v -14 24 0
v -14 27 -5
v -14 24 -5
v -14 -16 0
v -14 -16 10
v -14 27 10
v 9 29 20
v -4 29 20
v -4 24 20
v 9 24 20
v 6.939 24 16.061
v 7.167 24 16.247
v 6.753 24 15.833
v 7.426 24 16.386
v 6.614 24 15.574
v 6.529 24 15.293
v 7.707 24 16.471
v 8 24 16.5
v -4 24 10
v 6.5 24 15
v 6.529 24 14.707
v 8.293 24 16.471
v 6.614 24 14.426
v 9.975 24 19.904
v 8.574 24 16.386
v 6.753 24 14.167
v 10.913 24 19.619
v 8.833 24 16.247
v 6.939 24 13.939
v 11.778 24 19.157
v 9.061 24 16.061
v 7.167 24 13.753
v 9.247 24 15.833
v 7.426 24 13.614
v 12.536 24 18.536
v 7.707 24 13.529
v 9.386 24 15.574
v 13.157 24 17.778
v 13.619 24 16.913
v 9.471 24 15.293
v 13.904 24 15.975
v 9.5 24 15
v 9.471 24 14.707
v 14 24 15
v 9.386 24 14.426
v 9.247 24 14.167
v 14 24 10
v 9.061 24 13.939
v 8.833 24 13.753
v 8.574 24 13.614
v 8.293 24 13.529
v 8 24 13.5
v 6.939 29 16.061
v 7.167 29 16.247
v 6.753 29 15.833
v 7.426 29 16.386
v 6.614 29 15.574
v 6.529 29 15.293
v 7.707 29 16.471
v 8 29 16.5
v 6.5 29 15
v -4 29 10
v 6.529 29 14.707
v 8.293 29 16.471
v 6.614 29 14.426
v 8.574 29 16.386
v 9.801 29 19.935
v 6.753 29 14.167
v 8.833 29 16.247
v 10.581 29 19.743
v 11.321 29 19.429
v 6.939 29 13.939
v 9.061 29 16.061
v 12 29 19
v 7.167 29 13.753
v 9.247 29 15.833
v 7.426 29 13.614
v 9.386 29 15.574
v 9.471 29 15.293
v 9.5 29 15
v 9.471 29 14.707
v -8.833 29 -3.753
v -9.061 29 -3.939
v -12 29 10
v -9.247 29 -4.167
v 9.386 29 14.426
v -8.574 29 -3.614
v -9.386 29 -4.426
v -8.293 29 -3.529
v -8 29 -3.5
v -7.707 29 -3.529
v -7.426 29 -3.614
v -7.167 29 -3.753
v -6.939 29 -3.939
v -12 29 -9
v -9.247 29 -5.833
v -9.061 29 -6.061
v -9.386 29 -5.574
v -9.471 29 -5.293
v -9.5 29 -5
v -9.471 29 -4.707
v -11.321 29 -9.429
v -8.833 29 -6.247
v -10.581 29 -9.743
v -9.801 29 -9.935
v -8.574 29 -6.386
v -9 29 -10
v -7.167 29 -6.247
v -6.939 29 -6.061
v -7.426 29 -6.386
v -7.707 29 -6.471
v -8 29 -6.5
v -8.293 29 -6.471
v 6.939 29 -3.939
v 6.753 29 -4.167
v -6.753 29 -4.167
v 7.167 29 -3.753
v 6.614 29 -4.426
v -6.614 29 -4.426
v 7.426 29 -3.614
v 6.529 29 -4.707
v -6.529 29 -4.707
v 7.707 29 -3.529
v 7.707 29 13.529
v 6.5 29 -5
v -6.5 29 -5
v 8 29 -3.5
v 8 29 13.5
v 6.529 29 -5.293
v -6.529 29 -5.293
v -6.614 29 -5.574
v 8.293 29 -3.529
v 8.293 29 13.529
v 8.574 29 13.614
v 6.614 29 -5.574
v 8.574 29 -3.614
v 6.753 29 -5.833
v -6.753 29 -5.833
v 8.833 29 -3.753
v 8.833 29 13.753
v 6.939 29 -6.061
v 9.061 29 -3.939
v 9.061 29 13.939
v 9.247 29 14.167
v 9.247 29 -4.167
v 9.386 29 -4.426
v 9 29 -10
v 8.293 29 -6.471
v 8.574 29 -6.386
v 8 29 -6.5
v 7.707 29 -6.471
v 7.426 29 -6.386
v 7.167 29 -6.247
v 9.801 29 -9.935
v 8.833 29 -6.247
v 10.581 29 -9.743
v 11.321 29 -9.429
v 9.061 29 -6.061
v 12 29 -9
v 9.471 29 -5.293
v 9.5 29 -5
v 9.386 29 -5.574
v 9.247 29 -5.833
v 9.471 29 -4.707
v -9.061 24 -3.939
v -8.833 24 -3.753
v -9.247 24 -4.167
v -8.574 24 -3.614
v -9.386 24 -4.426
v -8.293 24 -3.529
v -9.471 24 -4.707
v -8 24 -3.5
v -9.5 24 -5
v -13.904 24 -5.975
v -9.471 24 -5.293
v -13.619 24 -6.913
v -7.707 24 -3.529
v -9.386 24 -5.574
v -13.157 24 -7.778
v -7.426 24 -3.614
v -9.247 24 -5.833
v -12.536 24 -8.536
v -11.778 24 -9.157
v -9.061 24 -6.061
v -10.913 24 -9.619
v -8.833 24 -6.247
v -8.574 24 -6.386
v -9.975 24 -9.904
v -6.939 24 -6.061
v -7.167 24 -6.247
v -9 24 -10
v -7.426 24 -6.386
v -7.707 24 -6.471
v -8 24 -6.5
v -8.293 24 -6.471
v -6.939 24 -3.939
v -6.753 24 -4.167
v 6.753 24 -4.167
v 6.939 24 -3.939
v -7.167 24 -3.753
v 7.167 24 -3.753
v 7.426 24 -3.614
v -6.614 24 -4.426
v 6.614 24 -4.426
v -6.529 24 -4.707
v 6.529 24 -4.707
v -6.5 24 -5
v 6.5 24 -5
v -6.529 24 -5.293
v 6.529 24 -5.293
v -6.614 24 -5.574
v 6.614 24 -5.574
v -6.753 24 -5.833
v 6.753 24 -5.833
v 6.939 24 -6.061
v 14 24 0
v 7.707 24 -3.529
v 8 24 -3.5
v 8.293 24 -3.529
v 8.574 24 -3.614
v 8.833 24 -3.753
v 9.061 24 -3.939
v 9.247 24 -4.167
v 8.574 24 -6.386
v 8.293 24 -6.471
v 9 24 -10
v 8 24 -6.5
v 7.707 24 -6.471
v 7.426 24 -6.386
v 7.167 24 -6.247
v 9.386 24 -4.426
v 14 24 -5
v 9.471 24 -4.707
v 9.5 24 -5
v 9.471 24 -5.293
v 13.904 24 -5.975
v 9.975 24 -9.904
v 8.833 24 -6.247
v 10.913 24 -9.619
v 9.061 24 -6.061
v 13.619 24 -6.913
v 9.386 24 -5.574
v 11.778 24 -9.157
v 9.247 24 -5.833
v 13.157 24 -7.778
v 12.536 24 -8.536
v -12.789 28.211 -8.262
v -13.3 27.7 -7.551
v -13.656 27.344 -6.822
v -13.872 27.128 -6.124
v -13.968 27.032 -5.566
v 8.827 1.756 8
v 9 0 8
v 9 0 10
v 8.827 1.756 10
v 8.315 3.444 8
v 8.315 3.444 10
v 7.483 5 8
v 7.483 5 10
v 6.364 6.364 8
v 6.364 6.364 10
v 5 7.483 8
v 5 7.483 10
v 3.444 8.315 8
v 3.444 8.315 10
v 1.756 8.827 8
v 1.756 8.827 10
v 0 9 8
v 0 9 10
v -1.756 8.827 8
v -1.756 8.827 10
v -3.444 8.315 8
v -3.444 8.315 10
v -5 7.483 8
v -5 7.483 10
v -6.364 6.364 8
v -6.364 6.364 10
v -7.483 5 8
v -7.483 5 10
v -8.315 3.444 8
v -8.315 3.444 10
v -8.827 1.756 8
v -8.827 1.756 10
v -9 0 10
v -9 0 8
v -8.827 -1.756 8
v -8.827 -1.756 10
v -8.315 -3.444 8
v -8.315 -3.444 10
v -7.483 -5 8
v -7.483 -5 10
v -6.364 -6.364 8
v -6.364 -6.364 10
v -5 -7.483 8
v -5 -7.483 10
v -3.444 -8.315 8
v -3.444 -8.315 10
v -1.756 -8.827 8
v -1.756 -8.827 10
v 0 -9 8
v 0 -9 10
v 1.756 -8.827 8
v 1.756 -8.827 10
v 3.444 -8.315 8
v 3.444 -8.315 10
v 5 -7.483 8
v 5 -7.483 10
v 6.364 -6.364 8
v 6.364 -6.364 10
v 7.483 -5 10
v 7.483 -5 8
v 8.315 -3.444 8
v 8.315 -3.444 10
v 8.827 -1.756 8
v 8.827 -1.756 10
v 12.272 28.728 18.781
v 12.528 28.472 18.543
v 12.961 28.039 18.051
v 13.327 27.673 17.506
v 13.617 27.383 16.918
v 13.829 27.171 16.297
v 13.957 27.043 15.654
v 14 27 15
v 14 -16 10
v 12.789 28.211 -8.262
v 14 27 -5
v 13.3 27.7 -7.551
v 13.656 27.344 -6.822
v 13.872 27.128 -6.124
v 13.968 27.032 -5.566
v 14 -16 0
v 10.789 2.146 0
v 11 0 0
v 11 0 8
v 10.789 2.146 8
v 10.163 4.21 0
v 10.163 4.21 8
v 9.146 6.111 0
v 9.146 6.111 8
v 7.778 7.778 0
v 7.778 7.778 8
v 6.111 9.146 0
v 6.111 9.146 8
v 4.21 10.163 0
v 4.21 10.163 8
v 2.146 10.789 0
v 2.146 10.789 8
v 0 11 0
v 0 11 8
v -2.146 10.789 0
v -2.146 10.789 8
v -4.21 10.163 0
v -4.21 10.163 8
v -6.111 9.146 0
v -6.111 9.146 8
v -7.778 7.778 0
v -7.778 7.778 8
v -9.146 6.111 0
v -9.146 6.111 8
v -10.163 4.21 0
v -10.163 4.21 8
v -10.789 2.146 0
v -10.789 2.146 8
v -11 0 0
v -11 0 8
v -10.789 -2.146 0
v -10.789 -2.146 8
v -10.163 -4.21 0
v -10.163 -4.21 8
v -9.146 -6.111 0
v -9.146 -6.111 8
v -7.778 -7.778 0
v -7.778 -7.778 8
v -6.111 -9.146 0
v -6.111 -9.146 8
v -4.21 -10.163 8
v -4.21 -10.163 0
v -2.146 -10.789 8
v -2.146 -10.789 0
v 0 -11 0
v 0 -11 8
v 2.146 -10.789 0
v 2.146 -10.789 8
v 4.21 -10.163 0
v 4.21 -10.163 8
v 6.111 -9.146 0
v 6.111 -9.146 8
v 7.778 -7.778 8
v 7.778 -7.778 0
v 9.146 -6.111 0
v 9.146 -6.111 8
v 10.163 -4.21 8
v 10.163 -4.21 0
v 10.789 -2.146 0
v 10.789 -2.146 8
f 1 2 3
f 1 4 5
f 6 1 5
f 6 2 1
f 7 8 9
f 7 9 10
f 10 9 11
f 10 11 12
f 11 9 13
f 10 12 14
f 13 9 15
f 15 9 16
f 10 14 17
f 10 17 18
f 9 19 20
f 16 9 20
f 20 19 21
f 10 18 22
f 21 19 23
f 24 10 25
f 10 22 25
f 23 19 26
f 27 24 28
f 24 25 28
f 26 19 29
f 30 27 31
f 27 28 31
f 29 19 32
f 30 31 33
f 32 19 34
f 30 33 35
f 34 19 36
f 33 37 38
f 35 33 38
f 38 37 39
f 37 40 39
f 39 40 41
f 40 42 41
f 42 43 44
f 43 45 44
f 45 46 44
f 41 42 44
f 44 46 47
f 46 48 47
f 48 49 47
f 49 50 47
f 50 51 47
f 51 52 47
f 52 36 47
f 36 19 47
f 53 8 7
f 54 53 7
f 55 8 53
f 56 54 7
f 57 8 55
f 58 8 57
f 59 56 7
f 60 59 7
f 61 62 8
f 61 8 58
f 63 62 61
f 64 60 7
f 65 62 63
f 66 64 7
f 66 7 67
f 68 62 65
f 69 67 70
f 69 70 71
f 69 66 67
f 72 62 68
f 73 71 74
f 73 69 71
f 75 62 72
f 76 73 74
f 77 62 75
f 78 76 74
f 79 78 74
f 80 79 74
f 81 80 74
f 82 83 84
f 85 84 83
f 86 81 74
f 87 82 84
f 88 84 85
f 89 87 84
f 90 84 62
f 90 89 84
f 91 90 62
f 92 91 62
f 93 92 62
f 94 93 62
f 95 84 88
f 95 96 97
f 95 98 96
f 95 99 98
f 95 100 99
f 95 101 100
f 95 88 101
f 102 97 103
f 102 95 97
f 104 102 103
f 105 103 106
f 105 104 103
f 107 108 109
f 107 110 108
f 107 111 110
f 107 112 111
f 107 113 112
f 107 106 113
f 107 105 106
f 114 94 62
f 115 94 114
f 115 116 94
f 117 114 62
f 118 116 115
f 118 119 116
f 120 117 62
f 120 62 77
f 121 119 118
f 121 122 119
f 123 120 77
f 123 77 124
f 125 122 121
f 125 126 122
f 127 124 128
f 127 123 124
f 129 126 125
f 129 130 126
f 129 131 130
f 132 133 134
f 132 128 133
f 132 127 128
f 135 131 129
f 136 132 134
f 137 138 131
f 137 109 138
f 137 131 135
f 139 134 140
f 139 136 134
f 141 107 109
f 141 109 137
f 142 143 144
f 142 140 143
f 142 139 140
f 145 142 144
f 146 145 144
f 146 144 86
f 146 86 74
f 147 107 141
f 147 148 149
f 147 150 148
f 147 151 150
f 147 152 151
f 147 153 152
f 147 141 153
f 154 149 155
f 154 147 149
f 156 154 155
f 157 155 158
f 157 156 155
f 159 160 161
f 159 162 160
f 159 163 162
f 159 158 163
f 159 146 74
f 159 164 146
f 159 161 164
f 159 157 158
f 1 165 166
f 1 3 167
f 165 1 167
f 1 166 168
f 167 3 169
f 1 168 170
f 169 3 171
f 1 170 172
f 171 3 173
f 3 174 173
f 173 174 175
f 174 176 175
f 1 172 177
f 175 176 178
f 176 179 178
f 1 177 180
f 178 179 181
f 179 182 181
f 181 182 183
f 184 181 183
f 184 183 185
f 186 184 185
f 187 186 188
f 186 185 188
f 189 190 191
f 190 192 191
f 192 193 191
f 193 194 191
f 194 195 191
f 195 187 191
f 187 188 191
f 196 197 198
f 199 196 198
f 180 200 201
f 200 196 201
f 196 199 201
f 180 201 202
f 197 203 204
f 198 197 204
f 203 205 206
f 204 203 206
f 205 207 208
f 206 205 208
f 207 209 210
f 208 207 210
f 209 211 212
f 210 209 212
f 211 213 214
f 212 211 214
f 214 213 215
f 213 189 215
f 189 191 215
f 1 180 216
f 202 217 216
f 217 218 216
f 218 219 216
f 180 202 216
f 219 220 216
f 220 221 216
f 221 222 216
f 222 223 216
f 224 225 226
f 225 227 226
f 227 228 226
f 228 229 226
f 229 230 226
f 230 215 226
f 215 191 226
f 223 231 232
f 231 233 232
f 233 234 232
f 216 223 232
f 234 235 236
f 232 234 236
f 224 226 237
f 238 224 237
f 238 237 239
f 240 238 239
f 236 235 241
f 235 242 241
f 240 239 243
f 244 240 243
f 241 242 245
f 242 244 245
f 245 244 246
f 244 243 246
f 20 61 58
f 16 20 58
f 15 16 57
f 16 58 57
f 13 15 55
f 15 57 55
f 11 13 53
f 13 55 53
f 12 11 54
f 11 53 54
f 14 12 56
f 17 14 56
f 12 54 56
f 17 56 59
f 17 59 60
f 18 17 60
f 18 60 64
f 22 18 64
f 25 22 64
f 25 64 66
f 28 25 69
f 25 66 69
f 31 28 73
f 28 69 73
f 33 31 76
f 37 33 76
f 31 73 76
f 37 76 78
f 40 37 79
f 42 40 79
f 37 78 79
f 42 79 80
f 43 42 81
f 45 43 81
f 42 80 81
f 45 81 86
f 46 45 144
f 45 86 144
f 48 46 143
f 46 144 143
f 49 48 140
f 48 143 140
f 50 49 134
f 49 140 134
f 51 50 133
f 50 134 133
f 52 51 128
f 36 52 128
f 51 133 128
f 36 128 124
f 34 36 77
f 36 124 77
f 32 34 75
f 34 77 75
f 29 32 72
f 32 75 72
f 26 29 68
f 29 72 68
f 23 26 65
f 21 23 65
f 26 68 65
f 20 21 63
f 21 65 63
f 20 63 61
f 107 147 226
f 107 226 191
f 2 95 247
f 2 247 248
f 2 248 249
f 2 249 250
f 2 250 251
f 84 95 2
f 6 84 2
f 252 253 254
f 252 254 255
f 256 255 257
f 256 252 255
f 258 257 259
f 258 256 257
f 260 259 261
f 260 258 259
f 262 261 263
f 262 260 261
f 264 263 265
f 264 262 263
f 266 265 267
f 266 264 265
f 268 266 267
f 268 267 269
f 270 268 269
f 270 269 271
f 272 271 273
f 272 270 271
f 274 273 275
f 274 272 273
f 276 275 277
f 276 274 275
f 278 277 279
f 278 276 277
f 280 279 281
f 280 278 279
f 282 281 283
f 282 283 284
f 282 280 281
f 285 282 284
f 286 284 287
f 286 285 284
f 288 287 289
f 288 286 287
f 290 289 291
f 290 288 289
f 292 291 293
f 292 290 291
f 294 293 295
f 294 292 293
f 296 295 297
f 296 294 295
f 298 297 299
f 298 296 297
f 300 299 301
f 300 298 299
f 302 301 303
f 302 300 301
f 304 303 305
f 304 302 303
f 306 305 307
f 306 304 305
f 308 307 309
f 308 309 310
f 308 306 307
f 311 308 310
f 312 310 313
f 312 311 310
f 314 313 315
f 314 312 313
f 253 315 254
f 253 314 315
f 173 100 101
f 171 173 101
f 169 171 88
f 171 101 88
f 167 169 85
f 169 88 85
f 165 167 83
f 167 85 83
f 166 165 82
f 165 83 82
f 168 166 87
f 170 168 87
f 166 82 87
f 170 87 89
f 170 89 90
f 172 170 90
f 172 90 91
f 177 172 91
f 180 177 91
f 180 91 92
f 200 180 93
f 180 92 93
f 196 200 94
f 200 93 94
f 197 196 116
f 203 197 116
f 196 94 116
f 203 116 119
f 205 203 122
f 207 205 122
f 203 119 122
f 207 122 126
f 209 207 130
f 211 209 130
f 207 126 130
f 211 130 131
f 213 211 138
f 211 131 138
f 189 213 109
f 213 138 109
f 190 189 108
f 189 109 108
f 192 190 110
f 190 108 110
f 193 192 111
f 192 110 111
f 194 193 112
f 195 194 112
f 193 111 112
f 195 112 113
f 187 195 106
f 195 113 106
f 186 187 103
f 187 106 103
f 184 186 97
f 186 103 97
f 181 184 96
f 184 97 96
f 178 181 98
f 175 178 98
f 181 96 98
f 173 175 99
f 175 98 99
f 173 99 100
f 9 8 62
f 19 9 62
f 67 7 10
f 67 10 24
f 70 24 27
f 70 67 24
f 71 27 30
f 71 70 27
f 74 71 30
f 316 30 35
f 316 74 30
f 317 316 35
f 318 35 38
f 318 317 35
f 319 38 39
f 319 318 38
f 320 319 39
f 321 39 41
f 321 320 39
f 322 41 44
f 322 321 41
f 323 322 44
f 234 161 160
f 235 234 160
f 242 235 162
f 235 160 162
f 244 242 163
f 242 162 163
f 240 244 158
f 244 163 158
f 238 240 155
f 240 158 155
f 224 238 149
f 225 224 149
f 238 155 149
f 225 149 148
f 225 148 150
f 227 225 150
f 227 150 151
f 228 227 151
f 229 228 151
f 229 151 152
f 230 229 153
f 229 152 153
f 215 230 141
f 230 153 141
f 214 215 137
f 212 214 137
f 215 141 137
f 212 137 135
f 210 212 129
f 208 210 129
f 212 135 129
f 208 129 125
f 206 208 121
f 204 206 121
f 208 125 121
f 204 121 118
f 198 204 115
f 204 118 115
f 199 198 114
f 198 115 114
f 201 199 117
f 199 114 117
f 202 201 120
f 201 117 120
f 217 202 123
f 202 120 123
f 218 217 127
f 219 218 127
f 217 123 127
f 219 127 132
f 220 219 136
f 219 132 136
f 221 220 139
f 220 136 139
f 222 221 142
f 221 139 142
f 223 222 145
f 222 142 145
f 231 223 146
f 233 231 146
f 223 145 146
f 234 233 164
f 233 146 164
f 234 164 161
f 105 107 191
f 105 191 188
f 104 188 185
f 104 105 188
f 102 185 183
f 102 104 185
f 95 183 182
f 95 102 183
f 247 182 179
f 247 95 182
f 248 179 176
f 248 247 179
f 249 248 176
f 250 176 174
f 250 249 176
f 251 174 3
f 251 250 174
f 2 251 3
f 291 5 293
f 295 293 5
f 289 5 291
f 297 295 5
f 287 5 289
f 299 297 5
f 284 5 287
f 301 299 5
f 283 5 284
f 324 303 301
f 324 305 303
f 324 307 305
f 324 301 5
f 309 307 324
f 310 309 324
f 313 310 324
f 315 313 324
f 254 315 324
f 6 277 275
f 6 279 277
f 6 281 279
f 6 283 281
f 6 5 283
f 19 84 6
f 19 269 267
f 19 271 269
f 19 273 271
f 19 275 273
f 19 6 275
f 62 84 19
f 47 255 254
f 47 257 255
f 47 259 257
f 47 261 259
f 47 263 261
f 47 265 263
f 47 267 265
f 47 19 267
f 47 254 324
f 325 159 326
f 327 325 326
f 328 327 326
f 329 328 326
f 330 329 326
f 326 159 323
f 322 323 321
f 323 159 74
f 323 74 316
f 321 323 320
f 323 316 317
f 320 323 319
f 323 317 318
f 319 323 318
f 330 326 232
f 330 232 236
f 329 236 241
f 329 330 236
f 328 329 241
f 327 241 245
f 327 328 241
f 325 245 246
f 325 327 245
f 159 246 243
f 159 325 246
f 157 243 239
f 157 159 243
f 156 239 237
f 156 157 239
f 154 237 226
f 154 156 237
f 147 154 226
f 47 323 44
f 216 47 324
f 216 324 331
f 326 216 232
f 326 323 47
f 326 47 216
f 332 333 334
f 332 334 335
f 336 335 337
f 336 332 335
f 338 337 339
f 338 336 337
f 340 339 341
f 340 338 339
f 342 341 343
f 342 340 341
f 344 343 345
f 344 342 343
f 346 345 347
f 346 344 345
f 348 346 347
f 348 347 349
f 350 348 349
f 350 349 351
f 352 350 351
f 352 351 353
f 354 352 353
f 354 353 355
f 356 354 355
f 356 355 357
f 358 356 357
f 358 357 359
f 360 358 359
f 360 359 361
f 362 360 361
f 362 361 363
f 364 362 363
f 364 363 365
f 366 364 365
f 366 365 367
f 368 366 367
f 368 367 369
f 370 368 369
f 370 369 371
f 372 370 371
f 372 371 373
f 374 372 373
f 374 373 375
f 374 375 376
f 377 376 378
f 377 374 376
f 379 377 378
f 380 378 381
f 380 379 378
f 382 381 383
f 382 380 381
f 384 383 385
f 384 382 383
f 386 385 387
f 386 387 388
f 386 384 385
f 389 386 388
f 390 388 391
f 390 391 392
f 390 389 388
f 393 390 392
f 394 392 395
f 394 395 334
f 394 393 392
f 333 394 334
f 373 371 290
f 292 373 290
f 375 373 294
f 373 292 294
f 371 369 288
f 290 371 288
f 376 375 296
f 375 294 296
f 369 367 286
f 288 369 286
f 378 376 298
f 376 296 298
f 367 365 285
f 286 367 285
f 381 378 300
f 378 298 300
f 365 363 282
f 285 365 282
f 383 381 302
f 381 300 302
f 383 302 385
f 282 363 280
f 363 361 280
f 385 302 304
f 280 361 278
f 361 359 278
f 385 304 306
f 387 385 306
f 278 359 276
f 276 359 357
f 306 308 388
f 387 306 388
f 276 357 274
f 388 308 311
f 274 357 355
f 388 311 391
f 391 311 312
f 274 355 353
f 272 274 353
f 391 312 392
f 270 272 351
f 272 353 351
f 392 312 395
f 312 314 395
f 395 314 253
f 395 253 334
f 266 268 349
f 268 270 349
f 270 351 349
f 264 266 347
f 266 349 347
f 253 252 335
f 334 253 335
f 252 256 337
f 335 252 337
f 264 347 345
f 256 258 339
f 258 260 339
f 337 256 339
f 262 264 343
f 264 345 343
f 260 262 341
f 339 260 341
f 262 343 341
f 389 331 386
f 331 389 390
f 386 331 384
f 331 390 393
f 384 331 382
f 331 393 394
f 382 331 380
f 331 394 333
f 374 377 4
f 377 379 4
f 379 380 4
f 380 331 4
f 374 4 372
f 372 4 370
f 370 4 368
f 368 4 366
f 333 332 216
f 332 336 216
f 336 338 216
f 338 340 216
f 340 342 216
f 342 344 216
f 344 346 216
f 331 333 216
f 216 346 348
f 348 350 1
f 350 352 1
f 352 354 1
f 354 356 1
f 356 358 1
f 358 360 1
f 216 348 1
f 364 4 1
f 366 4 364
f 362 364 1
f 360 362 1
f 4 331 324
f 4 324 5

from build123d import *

# Parameters (mm, degrees)
CROQUIS1_W              = 45
CROQUIS1_H              = 28
CROQUIS1_R              = 11
SALIENTE_EXTRUIR1_DEPTH = 10
SALIENTE_EXTRUIR2_START = -2
CROQUIS2_R              = 11
CROQUIS2_R_2            = 9
SALIENTE_EXTRUIR2_DEPTH = 2
CROQUIS3_R              = 1.5
SALIENTE_EXTRUIR3_DEPTH = 5
CORTAR_EXTRUIR1_REACH   = 46.011
CORTAR_EXTRUIR2_REACH   = 53.196
CROQUIS5_W              = 10
CROQUIS5_H              = 10


with BuildPart() as part:
    # Croquis1 → Saliente-Extruir1 (new body)
    with BuildSketch(Plane(origin=(0, 0, 0), x_dir=(0, 1, 0), z_dir=(0, 0, 1))):
        with Locations((6.5, 0)):
            Rectangle(CROQUIS1_W, CROQUIS1_H)
        with Locations(Location((0, 0, 0), (0, 0, 270))):
            Circle(CROQUIS1_R, mode=Mode.SUBTRACT)
    extrude(amount=SALIENTE_EXTRUIR1_DEPTH)

    # Croquis2 → Saliente-Extruir2 (add)
    with BuildSketch(Plane.XY.offset(10).offset(SALIENTE_EXTRUIR2_START)):
        Circle(CROQUIS2_R)
        Circle(CROQUIS2_R_2, mode=Mode.SUBTRACT)
    extrude(amount=SALIENTE_EXTRUIR2_DEPTH)

    # Croquis3 → Saliente-Extruir3 (add)
    # profile 1 of 2: a face of its own
    with BuildSketch(Plane(origin=(0, 29, 0), x_dir=(1, 0, 0), z_dir=(0, 1, 0))):
        with BuildLine():
            Line((-9, -20), (9, -20))
            ThreePointArc((9, -20), (12.535533906, -18.535533906), (14, -15))
            Line((14, -15), (14, -10))
            Line((14, -10), (-14, -10))
            Line((-14, -10), (-14, -15))
            ThreePointArc((-14, -15), (-12.535533906, -18.535533906), (-9, -20))
        make_face()
        with Locations(Location((8, -15, 0), (0, 0, 180))):
            Circle(CROQUIS3_R, mode=Mode.SUBTRACT)
        with Locations((-8, -15)):
            Circle(CROQUIS3_R, mode=Mode.SUBTRACT)
    # profile 2 of 2: a face of its own
    with BuildSketch(Plane(origin=(0, 29, 0), x_dir=(1, 0, 0), z_dir=(0, 1, 0))):
        with BuildLine():
            Line((-14, 0), (14, 0))
            Line((14, 0), (14, 5))
            ThreePointArc((14, 5), (12.535533906, 8.535533906), (9, 10))
            Line((9, 10), (-9, 10))
            ThreePointArc((-9, 10), (-12.535533906, 8.535533906), (-14, 5))
            Line((-14, 5), (-14, 0))
        make_face()
        with Locations(Location((-8, 5, 0), (0, 0, 180))):
            Circle(CROQUIS3_R, mode=Mode.SUBTRACT)
        with Locations((8, 5)):
            Circle(CROQUIS3_R, mode=Mode.SUBTRACT)
    extrude(amount=-SALIENTE_EXTRUIR3_DEPTH)

    # Croquis4 → Cortar-Extruir1 (cut, up to next)
    with BuildSketch(Plane.XY.offset(20), mode=Mode.PRIVATE) as cortar_extruir1_sk1:
        Polygon((12, 29), (14, 27), (14, 29), align=None)
    cortar_extruir1_tool1 = extrude(cortar_extruir1_sk1.sketch, amount=-CORTAR_EXTRUIR1_REACH, mode=Mode.PRIVATE) & part.part
    # Croquis4 → Cortar-Extruir1 (cut, up to next)
    with BuildSketch(Plane.XY.offset(20), mode=Mode.PRIVATE) as cortar_extruir1_sk2:
        Polygon((-14, 27), (-14, 29), (-12, 29), align=None)
    cortar_extruir1_tool2 = extrude(cortar_extruir1_sk2.sketch, amount=-CORTAR_EXTRUIR1_REACH, mode=Mode.PRIVATE) & part.part
    add(cortar_extruir1_tool1.solids().sort_by_distance((13.333333, 28.333333, 20))[0], mode=Mode.SUBTRACT)
    add(cortar_extruir1_tool2.solids().sort_by_distance((-13.333333, 28.333333, 20))[0], mode=Mode.SUBTRACT)

    # Croquis5 → Cortar-Extruir2 (cut, up to next)
    with BuildSketch(Plane(origin=(0, 29, 0), x_dir=(1, 0, 0), z_dir=(0, 1, 0)), mode=Mode.PRIVATE) as cortar_extruir2_sk1:
        with Locations((-9, -15)):
            Rectangle(CROQUIS5_W, CROQUIS5_H)
    cortar_extruir2_tool1 = extrude(cortar_extruir2_sk1.sketch, amount=-CORTAR_EXTRUIR2_REACH, mode=Mode.PRIVATE) & part.part
    add(cortar_extruir2_tool1.solids().sort_by_distance((-9, 29, 15))[0], mode=Mode.SUBTRACT)


solid = part.part
